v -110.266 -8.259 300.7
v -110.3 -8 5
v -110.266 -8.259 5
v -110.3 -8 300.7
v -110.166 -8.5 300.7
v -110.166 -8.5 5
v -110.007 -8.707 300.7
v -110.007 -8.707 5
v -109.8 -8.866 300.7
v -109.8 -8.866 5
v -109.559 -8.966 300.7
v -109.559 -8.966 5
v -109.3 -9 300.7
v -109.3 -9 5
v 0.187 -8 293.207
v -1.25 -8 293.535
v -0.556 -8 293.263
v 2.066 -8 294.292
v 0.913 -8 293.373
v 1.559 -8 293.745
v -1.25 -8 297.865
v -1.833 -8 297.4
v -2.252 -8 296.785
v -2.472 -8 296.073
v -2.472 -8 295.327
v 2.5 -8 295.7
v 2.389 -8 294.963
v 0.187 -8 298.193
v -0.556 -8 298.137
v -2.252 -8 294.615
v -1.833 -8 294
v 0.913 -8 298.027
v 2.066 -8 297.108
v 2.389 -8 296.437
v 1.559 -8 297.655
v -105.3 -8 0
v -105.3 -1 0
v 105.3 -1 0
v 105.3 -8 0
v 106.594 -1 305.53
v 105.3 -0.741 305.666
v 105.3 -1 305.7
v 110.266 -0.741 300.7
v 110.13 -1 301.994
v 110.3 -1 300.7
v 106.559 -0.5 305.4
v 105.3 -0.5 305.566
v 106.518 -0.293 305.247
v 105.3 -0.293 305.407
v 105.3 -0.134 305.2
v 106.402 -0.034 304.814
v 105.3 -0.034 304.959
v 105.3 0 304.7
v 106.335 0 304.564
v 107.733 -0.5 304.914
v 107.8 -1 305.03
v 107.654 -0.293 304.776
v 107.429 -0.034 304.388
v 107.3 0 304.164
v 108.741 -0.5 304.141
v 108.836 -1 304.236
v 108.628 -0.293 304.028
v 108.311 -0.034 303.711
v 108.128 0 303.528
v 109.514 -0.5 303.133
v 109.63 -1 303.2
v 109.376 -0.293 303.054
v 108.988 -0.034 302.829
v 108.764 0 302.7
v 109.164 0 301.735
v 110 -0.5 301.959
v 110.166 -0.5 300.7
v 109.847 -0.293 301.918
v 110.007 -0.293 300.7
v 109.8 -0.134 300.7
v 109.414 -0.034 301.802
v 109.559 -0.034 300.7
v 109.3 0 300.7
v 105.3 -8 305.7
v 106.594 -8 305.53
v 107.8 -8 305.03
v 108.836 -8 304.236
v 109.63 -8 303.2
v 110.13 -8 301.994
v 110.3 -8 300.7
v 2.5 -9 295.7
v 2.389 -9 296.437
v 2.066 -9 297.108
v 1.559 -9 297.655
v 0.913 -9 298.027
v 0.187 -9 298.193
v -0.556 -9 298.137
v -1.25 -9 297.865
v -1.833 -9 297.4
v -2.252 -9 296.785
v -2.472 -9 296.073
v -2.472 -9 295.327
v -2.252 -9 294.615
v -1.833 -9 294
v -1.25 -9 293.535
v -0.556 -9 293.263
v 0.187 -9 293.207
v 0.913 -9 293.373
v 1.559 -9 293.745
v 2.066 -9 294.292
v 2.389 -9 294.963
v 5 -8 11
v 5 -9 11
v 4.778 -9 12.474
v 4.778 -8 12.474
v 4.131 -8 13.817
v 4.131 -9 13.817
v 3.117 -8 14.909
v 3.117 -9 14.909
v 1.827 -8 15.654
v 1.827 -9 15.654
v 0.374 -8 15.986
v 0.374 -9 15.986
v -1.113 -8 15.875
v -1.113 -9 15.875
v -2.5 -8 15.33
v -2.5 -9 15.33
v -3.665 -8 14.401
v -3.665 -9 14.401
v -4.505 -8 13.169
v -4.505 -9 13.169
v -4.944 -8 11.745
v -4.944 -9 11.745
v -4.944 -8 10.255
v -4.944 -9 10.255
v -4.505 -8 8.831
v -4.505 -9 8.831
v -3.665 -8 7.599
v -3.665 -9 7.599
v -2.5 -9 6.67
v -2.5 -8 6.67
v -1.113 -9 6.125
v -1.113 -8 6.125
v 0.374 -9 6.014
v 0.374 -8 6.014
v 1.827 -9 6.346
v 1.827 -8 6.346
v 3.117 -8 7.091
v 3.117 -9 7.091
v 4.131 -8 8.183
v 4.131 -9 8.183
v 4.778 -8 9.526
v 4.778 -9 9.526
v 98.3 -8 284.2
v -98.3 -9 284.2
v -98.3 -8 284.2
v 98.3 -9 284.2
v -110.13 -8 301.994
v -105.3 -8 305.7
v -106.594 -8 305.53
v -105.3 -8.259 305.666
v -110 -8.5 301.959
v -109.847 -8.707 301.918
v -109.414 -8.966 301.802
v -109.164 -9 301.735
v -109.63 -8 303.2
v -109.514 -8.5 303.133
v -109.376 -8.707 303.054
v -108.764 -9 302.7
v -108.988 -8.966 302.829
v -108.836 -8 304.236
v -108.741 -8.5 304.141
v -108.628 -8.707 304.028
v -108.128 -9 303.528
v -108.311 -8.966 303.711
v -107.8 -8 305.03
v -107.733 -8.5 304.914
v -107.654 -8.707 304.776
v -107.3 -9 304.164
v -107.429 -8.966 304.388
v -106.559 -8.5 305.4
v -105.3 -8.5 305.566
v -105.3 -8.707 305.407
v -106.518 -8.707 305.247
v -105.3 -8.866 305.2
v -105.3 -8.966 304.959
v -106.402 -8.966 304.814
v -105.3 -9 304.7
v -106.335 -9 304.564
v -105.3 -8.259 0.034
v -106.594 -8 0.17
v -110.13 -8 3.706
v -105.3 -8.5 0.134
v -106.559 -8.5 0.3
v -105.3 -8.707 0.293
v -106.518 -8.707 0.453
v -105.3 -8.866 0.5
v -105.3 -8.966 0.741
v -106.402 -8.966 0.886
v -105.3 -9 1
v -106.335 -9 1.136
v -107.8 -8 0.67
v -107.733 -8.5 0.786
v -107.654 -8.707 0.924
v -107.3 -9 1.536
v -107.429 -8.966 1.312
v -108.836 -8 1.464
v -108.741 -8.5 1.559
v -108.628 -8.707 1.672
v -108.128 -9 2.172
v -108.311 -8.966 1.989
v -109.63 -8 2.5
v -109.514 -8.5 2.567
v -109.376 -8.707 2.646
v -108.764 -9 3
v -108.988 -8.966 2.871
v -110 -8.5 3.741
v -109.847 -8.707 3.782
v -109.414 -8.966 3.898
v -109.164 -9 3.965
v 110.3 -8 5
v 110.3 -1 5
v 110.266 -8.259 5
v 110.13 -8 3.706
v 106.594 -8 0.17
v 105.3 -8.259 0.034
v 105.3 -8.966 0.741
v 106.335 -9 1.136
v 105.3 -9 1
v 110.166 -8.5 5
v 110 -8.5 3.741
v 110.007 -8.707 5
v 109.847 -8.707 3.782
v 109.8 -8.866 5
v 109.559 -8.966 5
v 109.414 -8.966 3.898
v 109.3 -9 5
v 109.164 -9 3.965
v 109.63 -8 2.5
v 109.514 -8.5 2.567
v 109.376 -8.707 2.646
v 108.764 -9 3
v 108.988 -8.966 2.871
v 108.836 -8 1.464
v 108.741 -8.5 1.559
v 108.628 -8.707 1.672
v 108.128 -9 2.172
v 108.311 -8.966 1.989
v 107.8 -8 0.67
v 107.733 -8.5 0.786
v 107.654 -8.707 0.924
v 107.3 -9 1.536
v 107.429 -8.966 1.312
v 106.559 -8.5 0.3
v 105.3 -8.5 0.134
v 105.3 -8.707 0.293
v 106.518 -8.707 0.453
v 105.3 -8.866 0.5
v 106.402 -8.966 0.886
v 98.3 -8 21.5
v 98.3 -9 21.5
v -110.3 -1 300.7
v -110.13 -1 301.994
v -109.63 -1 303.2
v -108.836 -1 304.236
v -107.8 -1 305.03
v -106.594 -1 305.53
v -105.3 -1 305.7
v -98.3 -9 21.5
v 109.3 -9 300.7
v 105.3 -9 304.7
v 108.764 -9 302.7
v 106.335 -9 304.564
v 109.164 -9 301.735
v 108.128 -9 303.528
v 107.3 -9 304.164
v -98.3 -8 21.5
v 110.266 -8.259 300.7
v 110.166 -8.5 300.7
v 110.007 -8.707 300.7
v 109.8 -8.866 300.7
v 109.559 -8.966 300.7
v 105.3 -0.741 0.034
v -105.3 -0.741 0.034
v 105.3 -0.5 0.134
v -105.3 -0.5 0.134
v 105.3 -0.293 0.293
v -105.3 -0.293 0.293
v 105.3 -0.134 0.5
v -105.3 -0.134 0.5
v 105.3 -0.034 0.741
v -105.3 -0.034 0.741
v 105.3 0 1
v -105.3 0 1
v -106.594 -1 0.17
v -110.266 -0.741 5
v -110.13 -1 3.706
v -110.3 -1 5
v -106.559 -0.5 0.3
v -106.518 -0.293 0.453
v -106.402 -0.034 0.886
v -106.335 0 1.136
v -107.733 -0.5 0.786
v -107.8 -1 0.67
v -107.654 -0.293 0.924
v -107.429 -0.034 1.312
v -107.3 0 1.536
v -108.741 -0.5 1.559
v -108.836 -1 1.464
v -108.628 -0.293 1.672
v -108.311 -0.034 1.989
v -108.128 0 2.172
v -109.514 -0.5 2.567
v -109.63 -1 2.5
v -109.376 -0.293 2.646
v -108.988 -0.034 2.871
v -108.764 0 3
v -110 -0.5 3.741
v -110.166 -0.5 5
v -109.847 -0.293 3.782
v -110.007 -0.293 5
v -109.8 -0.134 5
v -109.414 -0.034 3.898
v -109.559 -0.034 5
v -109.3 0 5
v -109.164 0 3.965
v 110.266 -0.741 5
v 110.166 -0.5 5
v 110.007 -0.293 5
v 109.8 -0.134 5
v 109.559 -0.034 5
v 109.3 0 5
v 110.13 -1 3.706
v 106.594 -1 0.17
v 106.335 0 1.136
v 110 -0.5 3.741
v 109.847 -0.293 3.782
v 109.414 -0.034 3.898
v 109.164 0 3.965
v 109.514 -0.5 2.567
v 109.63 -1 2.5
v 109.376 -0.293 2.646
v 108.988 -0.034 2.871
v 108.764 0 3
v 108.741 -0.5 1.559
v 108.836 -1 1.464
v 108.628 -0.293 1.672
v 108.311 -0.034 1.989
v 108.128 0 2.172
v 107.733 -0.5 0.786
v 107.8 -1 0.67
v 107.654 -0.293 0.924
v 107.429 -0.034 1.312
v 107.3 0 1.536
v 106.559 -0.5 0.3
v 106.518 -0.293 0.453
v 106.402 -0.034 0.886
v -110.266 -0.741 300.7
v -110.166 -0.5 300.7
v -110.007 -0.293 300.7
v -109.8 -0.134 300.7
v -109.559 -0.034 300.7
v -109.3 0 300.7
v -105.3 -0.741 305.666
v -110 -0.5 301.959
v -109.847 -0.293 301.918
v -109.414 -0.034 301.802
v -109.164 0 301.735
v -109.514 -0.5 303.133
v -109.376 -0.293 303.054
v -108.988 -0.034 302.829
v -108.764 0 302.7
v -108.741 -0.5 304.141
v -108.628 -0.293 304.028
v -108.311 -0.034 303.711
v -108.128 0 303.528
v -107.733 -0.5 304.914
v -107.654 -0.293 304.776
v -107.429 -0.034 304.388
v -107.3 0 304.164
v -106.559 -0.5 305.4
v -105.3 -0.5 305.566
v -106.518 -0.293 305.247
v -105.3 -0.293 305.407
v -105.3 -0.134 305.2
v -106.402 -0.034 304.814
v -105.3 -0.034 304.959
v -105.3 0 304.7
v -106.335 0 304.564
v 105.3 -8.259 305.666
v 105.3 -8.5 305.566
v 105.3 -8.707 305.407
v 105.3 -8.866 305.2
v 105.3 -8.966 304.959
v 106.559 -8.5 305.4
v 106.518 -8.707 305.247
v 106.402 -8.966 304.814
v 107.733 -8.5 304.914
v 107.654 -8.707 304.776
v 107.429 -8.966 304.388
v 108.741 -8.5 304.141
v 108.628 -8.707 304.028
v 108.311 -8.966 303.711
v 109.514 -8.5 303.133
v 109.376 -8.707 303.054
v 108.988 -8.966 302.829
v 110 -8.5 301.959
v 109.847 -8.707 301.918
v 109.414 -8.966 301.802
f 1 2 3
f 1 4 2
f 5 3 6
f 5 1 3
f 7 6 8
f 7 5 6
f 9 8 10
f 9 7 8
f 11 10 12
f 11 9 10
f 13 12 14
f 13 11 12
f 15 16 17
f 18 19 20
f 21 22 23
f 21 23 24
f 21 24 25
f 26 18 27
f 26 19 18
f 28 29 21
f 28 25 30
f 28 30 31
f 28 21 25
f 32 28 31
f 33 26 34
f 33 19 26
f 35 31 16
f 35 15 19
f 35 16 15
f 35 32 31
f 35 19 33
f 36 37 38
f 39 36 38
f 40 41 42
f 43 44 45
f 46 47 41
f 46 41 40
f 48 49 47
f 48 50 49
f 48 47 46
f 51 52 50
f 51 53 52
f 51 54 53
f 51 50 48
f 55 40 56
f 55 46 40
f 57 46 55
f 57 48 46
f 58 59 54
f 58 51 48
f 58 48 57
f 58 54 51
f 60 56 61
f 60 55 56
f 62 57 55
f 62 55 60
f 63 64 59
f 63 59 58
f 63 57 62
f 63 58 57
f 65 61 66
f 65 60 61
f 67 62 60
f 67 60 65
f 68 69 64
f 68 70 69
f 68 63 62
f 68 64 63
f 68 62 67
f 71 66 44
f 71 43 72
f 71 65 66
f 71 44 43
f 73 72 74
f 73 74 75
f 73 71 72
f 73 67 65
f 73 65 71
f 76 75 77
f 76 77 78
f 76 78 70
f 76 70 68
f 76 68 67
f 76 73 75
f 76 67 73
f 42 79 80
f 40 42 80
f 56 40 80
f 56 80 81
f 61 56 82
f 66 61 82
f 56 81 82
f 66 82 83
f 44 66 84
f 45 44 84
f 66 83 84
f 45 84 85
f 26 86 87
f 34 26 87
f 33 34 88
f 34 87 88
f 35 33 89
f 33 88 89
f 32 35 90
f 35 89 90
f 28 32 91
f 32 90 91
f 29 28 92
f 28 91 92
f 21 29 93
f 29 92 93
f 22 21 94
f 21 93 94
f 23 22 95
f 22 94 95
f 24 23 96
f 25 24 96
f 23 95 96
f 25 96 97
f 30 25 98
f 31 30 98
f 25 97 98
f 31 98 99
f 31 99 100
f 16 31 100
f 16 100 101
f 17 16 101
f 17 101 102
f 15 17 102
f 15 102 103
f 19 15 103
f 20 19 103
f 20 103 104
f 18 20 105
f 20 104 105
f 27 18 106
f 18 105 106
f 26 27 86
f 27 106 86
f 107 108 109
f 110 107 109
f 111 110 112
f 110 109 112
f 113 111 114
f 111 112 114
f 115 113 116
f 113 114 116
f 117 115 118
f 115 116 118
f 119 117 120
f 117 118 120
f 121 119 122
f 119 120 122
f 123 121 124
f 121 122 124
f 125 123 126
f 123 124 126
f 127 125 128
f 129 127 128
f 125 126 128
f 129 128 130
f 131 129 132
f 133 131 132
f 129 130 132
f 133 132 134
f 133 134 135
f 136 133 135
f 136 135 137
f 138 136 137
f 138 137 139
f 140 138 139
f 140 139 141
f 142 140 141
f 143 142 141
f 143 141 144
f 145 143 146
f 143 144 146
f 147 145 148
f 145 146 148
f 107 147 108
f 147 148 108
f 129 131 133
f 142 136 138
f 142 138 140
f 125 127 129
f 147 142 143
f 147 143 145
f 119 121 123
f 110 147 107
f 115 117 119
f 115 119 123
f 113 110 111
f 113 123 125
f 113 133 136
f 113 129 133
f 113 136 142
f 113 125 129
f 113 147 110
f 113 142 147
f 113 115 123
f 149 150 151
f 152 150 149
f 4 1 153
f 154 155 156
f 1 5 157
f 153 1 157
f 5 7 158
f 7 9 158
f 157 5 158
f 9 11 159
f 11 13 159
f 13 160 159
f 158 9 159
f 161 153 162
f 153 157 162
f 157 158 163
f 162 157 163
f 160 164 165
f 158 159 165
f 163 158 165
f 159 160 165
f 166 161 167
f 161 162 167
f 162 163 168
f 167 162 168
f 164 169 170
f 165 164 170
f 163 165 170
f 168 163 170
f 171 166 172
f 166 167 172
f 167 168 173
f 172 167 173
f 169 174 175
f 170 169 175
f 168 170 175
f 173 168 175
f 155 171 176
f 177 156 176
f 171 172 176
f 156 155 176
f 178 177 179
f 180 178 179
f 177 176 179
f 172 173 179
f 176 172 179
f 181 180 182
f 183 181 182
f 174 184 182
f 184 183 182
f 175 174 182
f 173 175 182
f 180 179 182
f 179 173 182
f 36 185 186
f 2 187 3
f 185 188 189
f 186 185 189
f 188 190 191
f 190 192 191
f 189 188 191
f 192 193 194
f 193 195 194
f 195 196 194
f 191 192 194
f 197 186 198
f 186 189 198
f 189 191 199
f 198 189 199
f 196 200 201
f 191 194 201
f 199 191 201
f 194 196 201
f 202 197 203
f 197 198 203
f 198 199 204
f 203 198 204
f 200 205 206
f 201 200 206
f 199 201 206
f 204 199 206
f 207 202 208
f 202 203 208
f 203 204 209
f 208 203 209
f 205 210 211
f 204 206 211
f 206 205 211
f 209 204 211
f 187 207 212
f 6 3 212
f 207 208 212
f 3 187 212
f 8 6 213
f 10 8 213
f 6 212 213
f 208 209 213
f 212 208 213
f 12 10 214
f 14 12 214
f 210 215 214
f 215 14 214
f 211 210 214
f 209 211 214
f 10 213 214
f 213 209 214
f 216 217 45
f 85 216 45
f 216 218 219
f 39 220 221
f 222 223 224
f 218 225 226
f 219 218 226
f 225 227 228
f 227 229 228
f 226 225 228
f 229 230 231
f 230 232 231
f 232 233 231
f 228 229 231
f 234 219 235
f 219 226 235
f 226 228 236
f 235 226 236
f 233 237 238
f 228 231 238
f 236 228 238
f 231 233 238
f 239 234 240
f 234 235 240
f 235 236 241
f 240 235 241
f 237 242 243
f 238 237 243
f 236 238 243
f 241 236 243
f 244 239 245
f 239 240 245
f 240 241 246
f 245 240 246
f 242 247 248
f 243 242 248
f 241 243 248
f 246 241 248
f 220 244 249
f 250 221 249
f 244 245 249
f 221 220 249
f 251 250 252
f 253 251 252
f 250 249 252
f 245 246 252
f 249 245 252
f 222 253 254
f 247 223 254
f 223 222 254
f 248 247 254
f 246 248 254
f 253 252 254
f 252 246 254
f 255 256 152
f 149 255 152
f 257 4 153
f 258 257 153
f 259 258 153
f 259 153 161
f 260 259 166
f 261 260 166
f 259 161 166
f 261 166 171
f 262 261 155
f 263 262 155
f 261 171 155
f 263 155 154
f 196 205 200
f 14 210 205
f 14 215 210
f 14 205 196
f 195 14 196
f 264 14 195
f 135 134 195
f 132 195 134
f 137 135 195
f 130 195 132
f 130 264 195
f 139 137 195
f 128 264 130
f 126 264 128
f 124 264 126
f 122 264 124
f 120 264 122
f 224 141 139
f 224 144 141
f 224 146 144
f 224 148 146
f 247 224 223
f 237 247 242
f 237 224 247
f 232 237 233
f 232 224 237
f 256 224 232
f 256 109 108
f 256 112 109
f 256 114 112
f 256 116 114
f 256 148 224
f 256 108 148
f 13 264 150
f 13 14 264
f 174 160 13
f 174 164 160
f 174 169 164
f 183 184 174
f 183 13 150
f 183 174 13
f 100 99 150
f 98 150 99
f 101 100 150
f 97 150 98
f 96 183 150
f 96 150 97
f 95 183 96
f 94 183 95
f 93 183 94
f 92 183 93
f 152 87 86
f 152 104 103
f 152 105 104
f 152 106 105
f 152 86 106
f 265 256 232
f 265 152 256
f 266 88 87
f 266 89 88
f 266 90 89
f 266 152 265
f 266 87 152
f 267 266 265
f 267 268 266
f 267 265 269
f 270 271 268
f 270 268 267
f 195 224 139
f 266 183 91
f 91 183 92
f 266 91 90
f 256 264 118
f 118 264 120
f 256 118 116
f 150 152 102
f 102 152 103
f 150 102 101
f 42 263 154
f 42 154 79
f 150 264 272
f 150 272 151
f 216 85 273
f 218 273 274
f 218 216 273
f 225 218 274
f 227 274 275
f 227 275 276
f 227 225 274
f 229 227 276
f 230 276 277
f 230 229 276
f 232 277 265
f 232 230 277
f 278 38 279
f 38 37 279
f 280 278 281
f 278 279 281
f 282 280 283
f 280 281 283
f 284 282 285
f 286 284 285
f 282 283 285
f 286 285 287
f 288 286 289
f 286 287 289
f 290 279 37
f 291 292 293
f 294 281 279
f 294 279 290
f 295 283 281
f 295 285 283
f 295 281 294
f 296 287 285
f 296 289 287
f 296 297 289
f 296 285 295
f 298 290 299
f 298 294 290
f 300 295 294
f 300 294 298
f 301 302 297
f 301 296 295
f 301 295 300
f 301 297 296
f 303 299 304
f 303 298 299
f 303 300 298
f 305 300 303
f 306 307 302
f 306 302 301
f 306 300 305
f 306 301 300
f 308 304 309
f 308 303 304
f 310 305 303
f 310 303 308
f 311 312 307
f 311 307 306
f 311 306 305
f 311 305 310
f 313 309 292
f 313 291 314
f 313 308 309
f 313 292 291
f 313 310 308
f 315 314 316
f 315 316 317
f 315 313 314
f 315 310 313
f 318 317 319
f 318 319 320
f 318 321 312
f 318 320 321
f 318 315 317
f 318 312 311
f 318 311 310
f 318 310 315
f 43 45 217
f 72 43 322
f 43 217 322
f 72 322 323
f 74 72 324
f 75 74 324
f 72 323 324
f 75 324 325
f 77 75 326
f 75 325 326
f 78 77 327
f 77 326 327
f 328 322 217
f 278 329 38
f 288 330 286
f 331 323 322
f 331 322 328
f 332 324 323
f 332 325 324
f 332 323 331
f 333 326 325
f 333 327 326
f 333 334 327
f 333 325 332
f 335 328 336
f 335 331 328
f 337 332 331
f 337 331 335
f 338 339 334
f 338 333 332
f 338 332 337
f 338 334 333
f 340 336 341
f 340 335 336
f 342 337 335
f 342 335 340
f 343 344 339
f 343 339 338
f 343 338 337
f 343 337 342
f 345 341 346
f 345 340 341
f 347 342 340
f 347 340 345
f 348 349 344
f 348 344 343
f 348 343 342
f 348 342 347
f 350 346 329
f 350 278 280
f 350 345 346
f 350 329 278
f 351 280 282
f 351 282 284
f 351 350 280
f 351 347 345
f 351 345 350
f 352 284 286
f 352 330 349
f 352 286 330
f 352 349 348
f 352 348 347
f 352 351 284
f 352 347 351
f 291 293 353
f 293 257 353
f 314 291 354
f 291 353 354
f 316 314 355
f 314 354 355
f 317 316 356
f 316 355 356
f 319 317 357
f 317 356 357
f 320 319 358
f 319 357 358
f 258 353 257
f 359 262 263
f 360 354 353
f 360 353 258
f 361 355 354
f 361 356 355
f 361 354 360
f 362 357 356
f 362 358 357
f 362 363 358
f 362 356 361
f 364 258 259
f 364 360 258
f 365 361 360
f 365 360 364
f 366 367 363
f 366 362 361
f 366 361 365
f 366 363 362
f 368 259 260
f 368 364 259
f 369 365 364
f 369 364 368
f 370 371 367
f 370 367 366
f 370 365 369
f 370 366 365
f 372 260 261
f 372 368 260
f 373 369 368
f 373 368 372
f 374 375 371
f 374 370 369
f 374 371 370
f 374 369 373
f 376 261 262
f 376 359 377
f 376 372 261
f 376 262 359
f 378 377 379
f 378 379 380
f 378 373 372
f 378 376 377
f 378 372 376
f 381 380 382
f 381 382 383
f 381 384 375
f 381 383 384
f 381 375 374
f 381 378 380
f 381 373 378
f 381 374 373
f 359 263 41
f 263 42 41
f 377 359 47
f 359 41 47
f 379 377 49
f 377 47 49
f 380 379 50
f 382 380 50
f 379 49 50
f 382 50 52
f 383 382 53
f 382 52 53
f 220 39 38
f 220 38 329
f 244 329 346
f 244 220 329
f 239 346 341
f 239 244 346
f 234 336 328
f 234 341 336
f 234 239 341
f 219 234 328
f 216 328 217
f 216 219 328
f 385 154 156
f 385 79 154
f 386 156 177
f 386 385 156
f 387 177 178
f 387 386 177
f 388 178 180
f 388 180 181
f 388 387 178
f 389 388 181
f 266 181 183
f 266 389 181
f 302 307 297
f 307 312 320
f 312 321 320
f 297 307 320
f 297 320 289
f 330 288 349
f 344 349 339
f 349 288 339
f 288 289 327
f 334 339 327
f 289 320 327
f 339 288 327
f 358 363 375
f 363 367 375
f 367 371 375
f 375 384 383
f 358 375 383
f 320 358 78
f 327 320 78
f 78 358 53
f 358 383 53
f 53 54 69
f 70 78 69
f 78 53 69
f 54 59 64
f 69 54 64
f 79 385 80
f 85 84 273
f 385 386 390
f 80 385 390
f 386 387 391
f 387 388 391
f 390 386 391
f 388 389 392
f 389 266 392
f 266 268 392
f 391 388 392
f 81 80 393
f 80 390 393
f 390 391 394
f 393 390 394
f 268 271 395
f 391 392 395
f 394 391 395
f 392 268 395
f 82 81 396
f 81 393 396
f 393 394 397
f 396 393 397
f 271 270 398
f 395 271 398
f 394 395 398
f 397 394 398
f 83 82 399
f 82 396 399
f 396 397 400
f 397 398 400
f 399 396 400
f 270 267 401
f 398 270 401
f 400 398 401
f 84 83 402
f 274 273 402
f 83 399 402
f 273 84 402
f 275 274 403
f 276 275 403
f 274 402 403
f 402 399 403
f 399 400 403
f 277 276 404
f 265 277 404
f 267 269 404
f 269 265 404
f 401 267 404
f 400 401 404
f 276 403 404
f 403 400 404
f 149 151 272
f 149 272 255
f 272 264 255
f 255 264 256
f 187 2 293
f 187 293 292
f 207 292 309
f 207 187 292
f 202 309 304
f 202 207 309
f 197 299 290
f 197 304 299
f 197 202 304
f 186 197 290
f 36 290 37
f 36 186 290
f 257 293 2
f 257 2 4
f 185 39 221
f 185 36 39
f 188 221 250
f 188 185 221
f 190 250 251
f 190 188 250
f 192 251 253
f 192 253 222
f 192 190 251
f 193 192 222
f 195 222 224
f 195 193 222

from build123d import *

# Parameters (mm, degrees)
F0_W     = 220.6
F0_H     = 305.7
F1_DEPTH = 9
F2_W     = 196.6
F2_H     = 262.7
F3_DEPTH = 1
F4_R     = 2.5
F4_R_2   = 5
F5_DEPTH = 1
F6_R     = 5
F7_R     = 1


with BuildPart() as f1:
    # F0 (on Front) → F1 (new body)
    with BuildSketch(Plane.XZ):
        with Locations((0, 152.85)):
            Rectangle(F0_W, F0_H)
    extrude(amount=F1_DEPTH)

    # F2 (on face) → F3 (cut)
    with BuildSketch(Plane.XZ.offset(9)):
        with Locations((0, 152.85)):
            Rectangle(F2_W, F2_H)
    extrude(amount=-F3_DEPTH, mode=Mode.SUBTRACT)

    # F4 (on face) → F5 (cut)
    with BuildSketch(Plane.XZ.offset(9)):
        with Locations((0, 295.7)):
            Circle(F4_R)
        with Locations((0, 11)):
            Circle(F4_R_2)
    extrude(amount=-F5_DEPTH, mode=Mode.SUBTRACT)

    # F6
    f6_edges = [f1.edges().sort_by_distance(p)[0] for p in [
        (-110.3, -4.5, 0),
        (110.3, -4.5, 0),
        (110.3, -4.5, 305.7),
        (-110.3, -4.5, 305.7),
    ]]
    fillet(f6_edges, radius=F6_R)

    # F7
    f7_edges = [f1.edges().sort_by_distance(p)[0] for p in [
        (-110.3, -9, 152.85),
        (-110.3, 0, 152.85),
    ]]
    fillet(f7_edges, radius=F7_R)


solid = f1.part
